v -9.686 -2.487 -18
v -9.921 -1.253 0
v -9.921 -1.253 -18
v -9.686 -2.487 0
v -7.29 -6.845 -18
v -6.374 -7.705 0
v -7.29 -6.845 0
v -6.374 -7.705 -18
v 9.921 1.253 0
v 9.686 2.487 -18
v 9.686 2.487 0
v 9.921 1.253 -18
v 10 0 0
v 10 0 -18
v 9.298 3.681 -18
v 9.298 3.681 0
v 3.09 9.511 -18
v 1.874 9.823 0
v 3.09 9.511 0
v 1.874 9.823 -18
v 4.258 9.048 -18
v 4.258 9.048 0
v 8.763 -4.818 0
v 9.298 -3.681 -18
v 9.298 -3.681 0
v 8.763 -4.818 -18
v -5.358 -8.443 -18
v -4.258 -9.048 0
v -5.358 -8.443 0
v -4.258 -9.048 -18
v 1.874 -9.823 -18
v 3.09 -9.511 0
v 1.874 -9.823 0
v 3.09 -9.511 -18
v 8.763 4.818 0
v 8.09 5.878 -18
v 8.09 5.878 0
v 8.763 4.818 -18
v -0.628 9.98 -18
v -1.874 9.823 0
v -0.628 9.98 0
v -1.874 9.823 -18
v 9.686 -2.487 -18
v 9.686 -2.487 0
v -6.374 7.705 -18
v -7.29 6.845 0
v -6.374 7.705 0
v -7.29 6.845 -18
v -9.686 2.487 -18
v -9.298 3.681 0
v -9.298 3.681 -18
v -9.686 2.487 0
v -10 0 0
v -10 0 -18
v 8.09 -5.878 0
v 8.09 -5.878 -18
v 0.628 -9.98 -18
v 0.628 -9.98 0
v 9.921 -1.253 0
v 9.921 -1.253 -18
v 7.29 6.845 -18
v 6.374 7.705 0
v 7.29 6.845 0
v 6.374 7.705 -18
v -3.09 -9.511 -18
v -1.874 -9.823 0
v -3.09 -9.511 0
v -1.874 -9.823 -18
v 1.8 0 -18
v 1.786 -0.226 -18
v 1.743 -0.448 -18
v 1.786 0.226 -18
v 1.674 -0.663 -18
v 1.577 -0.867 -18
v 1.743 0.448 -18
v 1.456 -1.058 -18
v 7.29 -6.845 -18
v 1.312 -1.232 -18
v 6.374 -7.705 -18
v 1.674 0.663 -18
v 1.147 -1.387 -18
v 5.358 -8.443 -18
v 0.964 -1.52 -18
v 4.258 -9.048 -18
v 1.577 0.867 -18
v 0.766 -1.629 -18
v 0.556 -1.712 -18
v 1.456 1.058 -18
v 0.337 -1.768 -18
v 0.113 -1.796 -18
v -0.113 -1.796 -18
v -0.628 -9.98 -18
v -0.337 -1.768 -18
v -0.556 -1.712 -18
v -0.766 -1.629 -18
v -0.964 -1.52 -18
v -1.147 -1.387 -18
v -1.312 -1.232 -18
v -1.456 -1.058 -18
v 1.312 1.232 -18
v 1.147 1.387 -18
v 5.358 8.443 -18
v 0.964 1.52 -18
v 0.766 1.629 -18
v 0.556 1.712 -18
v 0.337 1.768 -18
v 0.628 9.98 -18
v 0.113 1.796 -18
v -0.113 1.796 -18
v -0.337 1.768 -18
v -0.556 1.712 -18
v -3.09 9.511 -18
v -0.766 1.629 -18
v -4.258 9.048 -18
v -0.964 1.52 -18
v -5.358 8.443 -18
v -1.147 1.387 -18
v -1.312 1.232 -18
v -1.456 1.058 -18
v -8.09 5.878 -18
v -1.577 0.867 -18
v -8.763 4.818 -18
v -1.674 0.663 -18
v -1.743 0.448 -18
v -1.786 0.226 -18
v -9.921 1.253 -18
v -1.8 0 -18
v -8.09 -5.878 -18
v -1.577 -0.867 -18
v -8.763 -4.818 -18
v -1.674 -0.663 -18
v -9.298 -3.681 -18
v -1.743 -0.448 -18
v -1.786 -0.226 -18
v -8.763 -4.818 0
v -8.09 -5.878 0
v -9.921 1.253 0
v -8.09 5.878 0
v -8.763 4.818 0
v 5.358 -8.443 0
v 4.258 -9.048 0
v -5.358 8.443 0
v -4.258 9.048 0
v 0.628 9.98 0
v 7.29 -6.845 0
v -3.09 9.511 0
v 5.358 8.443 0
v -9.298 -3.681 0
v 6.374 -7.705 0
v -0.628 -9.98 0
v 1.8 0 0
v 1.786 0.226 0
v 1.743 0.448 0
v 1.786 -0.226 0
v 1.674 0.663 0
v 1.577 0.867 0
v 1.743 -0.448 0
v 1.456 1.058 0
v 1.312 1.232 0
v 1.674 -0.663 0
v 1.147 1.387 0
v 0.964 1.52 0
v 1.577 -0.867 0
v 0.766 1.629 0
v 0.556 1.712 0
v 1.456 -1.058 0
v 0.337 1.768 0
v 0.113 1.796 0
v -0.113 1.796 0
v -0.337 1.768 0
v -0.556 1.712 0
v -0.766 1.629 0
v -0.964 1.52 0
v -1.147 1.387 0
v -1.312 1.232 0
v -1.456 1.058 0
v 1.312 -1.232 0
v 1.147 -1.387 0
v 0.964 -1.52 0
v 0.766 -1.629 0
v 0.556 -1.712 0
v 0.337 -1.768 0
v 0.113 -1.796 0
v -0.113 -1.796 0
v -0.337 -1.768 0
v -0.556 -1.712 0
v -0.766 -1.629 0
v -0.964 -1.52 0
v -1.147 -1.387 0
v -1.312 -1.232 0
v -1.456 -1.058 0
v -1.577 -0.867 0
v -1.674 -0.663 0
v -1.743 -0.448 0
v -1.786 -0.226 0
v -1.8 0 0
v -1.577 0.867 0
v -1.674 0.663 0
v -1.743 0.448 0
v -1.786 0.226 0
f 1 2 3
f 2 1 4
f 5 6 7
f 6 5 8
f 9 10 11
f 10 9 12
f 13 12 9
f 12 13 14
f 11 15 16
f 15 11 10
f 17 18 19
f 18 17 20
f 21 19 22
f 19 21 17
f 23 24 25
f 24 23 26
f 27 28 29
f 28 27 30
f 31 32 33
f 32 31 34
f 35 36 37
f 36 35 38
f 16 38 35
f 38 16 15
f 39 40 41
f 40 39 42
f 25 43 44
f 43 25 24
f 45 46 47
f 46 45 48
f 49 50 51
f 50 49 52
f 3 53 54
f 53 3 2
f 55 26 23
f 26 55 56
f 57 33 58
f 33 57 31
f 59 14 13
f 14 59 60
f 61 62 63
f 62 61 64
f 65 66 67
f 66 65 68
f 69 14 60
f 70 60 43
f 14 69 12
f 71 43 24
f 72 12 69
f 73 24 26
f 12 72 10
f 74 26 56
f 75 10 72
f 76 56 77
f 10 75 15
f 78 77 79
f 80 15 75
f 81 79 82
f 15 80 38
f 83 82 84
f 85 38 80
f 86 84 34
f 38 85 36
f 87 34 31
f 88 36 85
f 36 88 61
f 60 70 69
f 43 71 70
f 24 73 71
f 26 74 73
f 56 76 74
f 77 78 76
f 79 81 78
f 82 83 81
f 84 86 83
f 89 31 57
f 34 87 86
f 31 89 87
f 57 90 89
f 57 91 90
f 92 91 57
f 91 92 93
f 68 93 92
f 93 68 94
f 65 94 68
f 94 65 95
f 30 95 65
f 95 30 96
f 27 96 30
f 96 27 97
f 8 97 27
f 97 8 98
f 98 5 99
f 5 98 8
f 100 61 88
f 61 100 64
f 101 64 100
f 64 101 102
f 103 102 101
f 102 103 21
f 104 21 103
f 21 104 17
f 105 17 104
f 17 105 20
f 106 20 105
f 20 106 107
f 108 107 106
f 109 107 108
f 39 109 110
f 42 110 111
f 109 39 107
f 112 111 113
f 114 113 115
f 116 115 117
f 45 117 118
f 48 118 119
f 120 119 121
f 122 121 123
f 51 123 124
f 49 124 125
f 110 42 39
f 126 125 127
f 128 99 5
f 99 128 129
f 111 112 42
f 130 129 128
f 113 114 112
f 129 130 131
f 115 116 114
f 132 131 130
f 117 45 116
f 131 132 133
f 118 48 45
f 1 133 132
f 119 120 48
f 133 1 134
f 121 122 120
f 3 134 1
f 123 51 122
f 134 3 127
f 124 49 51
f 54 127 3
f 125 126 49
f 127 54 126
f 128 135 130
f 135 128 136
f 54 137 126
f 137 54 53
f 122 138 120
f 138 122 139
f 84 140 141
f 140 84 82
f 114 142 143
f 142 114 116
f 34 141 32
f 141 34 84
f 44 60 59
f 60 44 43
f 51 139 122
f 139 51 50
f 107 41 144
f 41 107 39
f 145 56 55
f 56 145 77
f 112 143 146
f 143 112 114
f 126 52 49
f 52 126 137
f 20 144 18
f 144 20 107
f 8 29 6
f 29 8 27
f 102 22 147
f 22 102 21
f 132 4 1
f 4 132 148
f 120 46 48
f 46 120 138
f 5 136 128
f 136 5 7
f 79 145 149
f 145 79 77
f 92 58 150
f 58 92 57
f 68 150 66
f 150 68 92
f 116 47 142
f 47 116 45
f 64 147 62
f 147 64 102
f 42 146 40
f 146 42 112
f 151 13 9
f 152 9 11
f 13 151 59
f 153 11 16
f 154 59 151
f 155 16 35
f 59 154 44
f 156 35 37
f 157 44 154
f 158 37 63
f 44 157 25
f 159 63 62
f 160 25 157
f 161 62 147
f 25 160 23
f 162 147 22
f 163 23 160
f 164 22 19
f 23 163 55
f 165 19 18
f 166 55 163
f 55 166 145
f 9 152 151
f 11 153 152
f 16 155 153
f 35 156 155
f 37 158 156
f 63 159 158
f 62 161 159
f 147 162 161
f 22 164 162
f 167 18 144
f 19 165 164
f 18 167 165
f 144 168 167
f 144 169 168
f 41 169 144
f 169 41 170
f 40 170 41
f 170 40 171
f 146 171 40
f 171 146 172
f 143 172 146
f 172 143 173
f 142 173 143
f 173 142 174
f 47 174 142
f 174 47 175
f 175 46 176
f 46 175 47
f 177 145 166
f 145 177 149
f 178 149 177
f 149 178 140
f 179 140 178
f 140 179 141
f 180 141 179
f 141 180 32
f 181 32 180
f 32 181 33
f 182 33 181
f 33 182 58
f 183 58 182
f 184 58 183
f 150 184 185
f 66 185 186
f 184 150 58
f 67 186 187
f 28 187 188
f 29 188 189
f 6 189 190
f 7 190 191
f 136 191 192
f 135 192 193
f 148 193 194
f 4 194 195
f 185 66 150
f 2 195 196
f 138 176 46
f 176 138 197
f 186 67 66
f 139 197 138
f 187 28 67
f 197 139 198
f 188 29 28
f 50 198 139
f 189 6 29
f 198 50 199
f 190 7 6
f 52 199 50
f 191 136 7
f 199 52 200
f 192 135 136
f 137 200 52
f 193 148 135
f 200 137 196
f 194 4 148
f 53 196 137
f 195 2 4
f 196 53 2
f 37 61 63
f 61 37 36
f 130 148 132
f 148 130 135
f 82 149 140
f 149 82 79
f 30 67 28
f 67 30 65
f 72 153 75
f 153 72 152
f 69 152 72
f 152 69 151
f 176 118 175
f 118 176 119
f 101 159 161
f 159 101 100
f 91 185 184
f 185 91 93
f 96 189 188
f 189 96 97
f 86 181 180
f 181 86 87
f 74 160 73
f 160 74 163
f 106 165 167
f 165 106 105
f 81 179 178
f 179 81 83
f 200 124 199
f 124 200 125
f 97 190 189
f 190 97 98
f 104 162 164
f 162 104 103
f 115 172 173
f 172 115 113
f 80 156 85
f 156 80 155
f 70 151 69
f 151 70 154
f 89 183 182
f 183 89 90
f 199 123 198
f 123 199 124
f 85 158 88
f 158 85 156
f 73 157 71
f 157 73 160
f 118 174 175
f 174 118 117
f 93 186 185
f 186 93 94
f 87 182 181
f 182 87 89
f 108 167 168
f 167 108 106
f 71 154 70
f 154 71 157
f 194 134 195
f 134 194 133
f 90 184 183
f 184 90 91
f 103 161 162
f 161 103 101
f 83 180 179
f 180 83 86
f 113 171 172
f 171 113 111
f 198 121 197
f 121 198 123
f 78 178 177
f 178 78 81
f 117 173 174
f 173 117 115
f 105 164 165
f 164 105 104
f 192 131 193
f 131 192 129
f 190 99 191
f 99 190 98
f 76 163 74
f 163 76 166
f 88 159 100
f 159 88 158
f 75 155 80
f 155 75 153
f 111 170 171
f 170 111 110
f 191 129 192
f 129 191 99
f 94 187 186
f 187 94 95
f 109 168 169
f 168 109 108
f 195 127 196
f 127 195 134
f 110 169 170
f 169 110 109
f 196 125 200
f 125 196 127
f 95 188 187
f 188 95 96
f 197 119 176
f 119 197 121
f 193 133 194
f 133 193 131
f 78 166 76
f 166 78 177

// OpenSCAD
$fn = 50;


difference() {
	union() {
		translate(v = [0, 0, -18.0000000000]) {
			cylinder(h = 18, r = 10.0000000000);
		}
		cylinder(h = 0, r = 19.0000000000);
	}
	union() {
		#translate(v = [0, 0, -18]) {
			cylinder(h = 18, r = 1.8000000000);
		}
	}
}
